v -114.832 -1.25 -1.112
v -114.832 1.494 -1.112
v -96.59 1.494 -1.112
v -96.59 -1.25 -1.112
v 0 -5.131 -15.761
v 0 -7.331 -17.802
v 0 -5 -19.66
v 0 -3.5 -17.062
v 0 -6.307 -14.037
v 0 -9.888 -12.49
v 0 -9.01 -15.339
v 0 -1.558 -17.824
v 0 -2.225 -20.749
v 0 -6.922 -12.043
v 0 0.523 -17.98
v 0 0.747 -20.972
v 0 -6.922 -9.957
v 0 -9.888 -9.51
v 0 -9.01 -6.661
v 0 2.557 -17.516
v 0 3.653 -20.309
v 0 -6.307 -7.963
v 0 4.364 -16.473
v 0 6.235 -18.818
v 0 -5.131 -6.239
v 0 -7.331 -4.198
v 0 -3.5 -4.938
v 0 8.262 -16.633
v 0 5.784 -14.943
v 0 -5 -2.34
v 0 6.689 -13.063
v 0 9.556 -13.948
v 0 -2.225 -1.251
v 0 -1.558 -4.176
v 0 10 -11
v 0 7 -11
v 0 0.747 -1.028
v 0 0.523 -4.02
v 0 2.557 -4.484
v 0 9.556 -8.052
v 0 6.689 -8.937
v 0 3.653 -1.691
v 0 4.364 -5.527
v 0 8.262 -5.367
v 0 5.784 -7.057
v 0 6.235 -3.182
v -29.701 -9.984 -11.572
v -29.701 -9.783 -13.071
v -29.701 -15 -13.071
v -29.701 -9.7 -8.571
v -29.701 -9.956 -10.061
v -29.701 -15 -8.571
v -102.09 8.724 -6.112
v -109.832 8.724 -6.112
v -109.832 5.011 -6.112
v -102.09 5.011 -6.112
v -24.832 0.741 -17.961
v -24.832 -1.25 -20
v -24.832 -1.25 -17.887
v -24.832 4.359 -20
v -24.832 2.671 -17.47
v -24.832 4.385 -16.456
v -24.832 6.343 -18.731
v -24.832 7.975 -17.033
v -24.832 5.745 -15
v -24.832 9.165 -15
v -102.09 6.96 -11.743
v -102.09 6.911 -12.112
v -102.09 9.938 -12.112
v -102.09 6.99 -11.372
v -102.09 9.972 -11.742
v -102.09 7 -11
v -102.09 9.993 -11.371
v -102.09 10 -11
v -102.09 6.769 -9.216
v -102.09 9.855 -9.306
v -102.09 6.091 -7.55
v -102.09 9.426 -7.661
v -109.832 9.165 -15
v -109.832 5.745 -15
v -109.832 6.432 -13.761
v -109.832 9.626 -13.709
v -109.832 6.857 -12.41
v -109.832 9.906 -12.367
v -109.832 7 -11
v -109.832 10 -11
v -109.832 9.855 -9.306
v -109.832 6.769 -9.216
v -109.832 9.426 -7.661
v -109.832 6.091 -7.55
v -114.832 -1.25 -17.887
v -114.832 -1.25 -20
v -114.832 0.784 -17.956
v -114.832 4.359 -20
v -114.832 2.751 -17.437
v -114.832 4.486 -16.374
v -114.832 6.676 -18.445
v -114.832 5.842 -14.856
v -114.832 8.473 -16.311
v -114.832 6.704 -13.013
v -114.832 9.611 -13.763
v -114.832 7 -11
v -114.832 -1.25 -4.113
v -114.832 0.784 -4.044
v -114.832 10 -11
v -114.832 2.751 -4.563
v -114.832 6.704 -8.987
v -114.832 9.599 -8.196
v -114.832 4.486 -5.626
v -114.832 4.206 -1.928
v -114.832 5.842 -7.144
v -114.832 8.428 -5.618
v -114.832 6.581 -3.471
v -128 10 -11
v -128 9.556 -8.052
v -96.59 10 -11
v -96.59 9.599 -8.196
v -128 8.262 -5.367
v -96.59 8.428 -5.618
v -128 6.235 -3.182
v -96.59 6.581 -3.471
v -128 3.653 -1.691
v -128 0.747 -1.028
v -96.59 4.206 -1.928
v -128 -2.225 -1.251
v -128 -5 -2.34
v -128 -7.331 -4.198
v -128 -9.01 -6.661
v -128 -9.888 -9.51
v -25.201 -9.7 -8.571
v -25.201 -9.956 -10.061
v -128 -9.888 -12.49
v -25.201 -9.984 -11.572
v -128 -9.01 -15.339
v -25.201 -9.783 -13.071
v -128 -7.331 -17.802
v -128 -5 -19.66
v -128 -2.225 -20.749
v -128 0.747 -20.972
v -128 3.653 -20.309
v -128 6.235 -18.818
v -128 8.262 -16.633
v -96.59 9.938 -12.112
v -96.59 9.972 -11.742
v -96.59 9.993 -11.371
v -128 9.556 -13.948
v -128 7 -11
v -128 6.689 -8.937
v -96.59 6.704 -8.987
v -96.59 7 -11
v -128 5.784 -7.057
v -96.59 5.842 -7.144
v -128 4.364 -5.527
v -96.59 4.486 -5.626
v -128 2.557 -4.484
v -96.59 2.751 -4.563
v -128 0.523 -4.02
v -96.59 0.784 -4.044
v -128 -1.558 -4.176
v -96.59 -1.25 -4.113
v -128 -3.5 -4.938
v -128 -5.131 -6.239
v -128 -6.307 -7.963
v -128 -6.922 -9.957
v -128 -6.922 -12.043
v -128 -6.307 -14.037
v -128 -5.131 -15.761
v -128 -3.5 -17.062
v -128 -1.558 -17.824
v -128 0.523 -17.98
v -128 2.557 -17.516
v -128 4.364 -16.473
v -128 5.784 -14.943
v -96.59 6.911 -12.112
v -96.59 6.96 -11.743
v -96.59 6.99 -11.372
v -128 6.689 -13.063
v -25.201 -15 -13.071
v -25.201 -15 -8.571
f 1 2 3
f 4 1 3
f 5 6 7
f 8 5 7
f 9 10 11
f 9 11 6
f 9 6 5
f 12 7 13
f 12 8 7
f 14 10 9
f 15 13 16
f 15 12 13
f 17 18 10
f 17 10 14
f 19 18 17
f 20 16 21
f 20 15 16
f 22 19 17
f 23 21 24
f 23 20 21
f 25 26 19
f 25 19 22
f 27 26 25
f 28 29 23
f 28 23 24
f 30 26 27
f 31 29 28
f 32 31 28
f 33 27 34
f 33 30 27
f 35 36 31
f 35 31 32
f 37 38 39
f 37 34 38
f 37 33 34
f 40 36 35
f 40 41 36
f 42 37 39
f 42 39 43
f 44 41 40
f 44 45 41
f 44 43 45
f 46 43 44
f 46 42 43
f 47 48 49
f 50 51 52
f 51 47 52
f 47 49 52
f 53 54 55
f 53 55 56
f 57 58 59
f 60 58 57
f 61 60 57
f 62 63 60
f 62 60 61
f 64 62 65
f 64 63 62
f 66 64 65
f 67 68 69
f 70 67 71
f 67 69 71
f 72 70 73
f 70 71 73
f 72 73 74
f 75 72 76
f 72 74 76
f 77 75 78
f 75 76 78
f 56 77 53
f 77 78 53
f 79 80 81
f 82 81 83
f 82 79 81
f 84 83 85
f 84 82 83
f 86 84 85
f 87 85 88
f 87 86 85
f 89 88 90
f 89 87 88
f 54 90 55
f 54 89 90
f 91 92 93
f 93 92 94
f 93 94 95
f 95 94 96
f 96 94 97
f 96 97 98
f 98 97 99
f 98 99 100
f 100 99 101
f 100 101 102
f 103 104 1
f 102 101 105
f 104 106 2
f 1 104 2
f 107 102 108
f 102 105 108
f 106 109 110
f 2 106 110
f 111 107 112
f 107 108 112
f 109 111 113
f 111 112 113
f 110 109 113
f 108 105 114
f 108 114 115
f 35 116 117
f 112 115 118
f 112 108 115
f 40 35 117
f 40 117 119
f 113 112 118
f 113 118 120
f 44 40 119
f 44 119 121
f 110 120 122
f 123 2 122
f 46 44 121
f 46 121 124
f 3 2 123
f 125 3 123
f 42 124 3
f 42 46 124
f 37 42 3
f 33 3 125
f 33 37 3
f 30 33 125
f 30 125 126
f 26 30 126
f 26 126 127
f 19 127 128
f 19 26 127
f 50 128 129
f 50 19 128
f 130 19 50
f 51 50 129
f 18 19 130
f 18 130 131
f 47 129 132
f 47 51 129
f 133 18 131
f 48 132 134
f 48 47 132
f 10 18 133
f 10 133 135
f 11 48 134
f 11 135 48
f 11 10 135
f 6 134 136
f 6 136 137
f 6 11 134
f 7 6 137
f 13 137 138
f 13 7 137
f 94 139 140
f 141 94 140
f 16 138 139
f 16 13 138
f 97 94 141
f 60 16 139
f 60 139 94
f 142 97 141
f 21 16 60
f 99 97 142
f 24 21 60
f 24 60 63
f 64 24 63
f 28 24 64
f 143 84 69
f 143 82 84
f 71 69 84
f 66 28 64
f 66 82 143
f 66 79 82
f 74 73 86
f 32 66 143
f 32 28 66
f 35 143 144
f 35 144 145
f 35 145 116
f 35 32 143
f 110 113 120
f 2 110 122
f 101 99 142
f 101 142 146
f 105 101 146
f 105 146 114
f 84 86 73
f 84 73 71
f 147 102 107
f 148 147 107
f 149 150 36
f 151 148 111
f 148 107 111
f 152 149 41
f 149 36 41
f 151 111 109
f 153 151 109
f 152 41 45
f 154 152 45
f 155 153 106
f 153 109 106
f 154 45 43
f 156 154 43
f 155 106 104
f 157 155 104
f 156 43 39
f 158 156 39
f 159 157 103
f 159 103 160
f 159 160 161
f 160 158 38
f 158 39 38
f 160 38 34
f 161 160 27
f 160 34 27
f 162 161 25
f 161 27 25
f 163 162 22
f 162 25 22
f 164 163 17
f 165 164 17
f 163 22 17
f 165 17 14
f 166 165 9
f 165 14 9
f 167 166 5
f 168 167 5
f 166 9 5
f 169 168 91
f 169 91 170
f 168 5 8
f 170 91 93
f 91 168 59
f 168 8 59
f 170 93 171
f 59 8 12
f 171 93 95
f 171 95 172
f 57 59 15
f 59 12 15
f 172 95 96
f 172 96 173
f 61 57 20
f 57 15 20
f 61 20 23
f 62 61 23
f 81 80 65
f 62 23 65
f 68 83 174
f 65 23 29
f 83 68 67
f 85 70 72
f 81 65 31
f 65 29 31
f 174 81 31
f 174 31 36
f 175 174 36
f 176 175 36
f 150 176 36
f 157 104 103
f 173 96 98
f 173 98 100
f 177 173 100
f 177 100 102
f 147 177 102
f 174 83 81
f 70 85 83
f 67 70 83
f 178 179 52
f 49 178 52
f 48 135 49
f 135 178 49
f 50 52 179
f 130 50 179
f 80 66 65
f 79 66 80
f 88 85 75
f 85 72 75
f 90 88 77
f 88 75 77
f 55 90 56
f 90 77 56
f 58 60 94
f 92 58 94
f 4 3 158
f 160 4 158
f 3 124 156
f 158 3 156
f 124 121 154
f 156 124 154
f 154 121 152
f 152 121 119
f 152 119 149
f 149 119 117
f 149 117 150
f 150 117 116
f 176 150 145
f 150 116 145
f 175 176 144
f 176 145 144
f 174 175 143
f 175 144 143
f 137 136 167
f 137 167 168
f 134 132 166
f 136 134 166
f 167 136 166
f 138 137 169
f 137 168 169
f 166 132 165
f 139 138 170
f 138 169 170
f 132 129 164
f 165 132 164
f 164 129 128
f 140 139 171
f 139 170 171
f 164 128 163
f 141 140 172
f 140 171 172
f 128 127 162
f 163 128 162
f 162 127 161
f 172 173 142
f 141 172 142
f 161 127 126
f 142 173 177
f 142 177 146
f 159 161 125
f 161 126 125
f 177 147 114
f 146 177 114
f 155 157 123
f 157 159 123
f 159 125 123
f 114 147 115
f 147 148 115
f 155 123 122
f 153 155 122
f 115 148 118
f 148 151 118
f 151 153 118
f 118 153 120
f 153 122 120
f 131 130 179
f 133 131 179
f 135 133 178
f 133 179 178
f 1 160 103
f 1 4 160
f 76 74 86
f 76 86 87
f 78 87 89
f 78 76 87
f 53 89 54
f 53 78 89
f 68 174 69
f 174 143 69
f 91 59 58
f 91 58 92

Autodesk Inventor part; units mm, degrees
ref_plane "YZ Plane" through (0, 0, 0) normal (1, 0, 0) x (0, 1, 0)
ref_plane "XY Plane" through (0, 0, 0) normal (0, 0, 1) x (1, 0, 0)
sketch "Schizzo2" plane through (0, 0, 0) normal (1, 0, 0) x (0, 1, 0)
  circle A0 centre (0, -11) radius 10
  point P0 (0, 0)
  dimension "d4" = 11
  dimension "d5" = 20
extrude "Estrusione1" add sketch "Schizzo2" against normal blind 128
shell "Svuotamento1" thickness 3 removed faces 2 at (0, -3.2365, -10.2023) at (-128, -3.2365, -10.2023)
sketch "Schizzo1" plane through (0, 0, 0) normal (0, 1, 0) x (-1, 0, 0)
  line L0 (0, 0) -> (0, -20)
  line L1 (0, -10) -> (128, -10)
  line L2 (128, 0) -> (128, -20)
  line L3 (0, -20) -> (25, -20)
  line L4 (25, -20) -> (128, -20)
  line L5 (128, 0) -> (0, 0)
  dimension "d0" = 20
  dimension "d3" = 25
ref_plane "Piano di lavoro7" through (0, 10, -11) normal (0, 1, 0) x (-1, 0, 0)
sketch "Schizzo13" plane through (0, 10, -11) normal (0, 1, 0) x (-1, 0, 0)
  line L0 (24.8317, -9) -> (114.8317, -9)
  line L1 (24.8317, -9) -> (24.8317, -4)
  line L2 (24.8317, -4) -> (109.8317, -4)
  line L3 (114.8317, -9) -> (114.8317, 9.8878)
  line L4 (0, 7) -> (128, 7) projected
  line L5 (109.8317, -4) -> (109.8317, 4.8878)
  line L6 (114.8317, 9.8878) -> (96.5899, 9.8878)
  line L7 (96.5899, 9.8878) -> (96.5899, -1.1122)
  line L8 (96.5899, -1.1122) -> (102.0899, -1.1122)
  line L9 (102.0899, -1.1122) -> (102.0899, 4.8878)
  line L10 (109.8317, 4.8878) -> (102.0899, 4.8878)
  point P0 (0, 11)
  dimension "d59" = 90
  dimension "d60" = 5
  dimension "d61" = 85
  dimension "d62" = 6
  dimension "d63" = 5
  dimension "d64" = 5.5
  dimension "d65" = 11
extrude "Estrusione7" cut sketch "Schizzo13" against normal blind 11.25
ref_plane "Piano di lavoro8" through (0, -10, -11) normal (0, 1, 0) x (-1, 0, 0)
sketch "Schizzo14" plane through (0, -10, -11) normal (0, 1, 0) x (-1, 0, 0)
  line L0 (25.2013, -2.0707) -> (29.7013, -2.0707)
  line L1 (29.7013, -2.0707) -> (29.7013, 2.4293)
  line L2 (29.7013, 2.4293) -> (25.2013, 2.4293)
  line L3 (25.2013, 2.4293) -> (25.2013, -2.0707)
  point P0 (0, 11)
  dimension "d68" = 4.5
  dimension "d69" = 4.5
extrude "Estrusione8" add sketch "Schizzo14" along normal blind 2.5 and the other way blind 5
properties part number "astaoscilla2_306"
